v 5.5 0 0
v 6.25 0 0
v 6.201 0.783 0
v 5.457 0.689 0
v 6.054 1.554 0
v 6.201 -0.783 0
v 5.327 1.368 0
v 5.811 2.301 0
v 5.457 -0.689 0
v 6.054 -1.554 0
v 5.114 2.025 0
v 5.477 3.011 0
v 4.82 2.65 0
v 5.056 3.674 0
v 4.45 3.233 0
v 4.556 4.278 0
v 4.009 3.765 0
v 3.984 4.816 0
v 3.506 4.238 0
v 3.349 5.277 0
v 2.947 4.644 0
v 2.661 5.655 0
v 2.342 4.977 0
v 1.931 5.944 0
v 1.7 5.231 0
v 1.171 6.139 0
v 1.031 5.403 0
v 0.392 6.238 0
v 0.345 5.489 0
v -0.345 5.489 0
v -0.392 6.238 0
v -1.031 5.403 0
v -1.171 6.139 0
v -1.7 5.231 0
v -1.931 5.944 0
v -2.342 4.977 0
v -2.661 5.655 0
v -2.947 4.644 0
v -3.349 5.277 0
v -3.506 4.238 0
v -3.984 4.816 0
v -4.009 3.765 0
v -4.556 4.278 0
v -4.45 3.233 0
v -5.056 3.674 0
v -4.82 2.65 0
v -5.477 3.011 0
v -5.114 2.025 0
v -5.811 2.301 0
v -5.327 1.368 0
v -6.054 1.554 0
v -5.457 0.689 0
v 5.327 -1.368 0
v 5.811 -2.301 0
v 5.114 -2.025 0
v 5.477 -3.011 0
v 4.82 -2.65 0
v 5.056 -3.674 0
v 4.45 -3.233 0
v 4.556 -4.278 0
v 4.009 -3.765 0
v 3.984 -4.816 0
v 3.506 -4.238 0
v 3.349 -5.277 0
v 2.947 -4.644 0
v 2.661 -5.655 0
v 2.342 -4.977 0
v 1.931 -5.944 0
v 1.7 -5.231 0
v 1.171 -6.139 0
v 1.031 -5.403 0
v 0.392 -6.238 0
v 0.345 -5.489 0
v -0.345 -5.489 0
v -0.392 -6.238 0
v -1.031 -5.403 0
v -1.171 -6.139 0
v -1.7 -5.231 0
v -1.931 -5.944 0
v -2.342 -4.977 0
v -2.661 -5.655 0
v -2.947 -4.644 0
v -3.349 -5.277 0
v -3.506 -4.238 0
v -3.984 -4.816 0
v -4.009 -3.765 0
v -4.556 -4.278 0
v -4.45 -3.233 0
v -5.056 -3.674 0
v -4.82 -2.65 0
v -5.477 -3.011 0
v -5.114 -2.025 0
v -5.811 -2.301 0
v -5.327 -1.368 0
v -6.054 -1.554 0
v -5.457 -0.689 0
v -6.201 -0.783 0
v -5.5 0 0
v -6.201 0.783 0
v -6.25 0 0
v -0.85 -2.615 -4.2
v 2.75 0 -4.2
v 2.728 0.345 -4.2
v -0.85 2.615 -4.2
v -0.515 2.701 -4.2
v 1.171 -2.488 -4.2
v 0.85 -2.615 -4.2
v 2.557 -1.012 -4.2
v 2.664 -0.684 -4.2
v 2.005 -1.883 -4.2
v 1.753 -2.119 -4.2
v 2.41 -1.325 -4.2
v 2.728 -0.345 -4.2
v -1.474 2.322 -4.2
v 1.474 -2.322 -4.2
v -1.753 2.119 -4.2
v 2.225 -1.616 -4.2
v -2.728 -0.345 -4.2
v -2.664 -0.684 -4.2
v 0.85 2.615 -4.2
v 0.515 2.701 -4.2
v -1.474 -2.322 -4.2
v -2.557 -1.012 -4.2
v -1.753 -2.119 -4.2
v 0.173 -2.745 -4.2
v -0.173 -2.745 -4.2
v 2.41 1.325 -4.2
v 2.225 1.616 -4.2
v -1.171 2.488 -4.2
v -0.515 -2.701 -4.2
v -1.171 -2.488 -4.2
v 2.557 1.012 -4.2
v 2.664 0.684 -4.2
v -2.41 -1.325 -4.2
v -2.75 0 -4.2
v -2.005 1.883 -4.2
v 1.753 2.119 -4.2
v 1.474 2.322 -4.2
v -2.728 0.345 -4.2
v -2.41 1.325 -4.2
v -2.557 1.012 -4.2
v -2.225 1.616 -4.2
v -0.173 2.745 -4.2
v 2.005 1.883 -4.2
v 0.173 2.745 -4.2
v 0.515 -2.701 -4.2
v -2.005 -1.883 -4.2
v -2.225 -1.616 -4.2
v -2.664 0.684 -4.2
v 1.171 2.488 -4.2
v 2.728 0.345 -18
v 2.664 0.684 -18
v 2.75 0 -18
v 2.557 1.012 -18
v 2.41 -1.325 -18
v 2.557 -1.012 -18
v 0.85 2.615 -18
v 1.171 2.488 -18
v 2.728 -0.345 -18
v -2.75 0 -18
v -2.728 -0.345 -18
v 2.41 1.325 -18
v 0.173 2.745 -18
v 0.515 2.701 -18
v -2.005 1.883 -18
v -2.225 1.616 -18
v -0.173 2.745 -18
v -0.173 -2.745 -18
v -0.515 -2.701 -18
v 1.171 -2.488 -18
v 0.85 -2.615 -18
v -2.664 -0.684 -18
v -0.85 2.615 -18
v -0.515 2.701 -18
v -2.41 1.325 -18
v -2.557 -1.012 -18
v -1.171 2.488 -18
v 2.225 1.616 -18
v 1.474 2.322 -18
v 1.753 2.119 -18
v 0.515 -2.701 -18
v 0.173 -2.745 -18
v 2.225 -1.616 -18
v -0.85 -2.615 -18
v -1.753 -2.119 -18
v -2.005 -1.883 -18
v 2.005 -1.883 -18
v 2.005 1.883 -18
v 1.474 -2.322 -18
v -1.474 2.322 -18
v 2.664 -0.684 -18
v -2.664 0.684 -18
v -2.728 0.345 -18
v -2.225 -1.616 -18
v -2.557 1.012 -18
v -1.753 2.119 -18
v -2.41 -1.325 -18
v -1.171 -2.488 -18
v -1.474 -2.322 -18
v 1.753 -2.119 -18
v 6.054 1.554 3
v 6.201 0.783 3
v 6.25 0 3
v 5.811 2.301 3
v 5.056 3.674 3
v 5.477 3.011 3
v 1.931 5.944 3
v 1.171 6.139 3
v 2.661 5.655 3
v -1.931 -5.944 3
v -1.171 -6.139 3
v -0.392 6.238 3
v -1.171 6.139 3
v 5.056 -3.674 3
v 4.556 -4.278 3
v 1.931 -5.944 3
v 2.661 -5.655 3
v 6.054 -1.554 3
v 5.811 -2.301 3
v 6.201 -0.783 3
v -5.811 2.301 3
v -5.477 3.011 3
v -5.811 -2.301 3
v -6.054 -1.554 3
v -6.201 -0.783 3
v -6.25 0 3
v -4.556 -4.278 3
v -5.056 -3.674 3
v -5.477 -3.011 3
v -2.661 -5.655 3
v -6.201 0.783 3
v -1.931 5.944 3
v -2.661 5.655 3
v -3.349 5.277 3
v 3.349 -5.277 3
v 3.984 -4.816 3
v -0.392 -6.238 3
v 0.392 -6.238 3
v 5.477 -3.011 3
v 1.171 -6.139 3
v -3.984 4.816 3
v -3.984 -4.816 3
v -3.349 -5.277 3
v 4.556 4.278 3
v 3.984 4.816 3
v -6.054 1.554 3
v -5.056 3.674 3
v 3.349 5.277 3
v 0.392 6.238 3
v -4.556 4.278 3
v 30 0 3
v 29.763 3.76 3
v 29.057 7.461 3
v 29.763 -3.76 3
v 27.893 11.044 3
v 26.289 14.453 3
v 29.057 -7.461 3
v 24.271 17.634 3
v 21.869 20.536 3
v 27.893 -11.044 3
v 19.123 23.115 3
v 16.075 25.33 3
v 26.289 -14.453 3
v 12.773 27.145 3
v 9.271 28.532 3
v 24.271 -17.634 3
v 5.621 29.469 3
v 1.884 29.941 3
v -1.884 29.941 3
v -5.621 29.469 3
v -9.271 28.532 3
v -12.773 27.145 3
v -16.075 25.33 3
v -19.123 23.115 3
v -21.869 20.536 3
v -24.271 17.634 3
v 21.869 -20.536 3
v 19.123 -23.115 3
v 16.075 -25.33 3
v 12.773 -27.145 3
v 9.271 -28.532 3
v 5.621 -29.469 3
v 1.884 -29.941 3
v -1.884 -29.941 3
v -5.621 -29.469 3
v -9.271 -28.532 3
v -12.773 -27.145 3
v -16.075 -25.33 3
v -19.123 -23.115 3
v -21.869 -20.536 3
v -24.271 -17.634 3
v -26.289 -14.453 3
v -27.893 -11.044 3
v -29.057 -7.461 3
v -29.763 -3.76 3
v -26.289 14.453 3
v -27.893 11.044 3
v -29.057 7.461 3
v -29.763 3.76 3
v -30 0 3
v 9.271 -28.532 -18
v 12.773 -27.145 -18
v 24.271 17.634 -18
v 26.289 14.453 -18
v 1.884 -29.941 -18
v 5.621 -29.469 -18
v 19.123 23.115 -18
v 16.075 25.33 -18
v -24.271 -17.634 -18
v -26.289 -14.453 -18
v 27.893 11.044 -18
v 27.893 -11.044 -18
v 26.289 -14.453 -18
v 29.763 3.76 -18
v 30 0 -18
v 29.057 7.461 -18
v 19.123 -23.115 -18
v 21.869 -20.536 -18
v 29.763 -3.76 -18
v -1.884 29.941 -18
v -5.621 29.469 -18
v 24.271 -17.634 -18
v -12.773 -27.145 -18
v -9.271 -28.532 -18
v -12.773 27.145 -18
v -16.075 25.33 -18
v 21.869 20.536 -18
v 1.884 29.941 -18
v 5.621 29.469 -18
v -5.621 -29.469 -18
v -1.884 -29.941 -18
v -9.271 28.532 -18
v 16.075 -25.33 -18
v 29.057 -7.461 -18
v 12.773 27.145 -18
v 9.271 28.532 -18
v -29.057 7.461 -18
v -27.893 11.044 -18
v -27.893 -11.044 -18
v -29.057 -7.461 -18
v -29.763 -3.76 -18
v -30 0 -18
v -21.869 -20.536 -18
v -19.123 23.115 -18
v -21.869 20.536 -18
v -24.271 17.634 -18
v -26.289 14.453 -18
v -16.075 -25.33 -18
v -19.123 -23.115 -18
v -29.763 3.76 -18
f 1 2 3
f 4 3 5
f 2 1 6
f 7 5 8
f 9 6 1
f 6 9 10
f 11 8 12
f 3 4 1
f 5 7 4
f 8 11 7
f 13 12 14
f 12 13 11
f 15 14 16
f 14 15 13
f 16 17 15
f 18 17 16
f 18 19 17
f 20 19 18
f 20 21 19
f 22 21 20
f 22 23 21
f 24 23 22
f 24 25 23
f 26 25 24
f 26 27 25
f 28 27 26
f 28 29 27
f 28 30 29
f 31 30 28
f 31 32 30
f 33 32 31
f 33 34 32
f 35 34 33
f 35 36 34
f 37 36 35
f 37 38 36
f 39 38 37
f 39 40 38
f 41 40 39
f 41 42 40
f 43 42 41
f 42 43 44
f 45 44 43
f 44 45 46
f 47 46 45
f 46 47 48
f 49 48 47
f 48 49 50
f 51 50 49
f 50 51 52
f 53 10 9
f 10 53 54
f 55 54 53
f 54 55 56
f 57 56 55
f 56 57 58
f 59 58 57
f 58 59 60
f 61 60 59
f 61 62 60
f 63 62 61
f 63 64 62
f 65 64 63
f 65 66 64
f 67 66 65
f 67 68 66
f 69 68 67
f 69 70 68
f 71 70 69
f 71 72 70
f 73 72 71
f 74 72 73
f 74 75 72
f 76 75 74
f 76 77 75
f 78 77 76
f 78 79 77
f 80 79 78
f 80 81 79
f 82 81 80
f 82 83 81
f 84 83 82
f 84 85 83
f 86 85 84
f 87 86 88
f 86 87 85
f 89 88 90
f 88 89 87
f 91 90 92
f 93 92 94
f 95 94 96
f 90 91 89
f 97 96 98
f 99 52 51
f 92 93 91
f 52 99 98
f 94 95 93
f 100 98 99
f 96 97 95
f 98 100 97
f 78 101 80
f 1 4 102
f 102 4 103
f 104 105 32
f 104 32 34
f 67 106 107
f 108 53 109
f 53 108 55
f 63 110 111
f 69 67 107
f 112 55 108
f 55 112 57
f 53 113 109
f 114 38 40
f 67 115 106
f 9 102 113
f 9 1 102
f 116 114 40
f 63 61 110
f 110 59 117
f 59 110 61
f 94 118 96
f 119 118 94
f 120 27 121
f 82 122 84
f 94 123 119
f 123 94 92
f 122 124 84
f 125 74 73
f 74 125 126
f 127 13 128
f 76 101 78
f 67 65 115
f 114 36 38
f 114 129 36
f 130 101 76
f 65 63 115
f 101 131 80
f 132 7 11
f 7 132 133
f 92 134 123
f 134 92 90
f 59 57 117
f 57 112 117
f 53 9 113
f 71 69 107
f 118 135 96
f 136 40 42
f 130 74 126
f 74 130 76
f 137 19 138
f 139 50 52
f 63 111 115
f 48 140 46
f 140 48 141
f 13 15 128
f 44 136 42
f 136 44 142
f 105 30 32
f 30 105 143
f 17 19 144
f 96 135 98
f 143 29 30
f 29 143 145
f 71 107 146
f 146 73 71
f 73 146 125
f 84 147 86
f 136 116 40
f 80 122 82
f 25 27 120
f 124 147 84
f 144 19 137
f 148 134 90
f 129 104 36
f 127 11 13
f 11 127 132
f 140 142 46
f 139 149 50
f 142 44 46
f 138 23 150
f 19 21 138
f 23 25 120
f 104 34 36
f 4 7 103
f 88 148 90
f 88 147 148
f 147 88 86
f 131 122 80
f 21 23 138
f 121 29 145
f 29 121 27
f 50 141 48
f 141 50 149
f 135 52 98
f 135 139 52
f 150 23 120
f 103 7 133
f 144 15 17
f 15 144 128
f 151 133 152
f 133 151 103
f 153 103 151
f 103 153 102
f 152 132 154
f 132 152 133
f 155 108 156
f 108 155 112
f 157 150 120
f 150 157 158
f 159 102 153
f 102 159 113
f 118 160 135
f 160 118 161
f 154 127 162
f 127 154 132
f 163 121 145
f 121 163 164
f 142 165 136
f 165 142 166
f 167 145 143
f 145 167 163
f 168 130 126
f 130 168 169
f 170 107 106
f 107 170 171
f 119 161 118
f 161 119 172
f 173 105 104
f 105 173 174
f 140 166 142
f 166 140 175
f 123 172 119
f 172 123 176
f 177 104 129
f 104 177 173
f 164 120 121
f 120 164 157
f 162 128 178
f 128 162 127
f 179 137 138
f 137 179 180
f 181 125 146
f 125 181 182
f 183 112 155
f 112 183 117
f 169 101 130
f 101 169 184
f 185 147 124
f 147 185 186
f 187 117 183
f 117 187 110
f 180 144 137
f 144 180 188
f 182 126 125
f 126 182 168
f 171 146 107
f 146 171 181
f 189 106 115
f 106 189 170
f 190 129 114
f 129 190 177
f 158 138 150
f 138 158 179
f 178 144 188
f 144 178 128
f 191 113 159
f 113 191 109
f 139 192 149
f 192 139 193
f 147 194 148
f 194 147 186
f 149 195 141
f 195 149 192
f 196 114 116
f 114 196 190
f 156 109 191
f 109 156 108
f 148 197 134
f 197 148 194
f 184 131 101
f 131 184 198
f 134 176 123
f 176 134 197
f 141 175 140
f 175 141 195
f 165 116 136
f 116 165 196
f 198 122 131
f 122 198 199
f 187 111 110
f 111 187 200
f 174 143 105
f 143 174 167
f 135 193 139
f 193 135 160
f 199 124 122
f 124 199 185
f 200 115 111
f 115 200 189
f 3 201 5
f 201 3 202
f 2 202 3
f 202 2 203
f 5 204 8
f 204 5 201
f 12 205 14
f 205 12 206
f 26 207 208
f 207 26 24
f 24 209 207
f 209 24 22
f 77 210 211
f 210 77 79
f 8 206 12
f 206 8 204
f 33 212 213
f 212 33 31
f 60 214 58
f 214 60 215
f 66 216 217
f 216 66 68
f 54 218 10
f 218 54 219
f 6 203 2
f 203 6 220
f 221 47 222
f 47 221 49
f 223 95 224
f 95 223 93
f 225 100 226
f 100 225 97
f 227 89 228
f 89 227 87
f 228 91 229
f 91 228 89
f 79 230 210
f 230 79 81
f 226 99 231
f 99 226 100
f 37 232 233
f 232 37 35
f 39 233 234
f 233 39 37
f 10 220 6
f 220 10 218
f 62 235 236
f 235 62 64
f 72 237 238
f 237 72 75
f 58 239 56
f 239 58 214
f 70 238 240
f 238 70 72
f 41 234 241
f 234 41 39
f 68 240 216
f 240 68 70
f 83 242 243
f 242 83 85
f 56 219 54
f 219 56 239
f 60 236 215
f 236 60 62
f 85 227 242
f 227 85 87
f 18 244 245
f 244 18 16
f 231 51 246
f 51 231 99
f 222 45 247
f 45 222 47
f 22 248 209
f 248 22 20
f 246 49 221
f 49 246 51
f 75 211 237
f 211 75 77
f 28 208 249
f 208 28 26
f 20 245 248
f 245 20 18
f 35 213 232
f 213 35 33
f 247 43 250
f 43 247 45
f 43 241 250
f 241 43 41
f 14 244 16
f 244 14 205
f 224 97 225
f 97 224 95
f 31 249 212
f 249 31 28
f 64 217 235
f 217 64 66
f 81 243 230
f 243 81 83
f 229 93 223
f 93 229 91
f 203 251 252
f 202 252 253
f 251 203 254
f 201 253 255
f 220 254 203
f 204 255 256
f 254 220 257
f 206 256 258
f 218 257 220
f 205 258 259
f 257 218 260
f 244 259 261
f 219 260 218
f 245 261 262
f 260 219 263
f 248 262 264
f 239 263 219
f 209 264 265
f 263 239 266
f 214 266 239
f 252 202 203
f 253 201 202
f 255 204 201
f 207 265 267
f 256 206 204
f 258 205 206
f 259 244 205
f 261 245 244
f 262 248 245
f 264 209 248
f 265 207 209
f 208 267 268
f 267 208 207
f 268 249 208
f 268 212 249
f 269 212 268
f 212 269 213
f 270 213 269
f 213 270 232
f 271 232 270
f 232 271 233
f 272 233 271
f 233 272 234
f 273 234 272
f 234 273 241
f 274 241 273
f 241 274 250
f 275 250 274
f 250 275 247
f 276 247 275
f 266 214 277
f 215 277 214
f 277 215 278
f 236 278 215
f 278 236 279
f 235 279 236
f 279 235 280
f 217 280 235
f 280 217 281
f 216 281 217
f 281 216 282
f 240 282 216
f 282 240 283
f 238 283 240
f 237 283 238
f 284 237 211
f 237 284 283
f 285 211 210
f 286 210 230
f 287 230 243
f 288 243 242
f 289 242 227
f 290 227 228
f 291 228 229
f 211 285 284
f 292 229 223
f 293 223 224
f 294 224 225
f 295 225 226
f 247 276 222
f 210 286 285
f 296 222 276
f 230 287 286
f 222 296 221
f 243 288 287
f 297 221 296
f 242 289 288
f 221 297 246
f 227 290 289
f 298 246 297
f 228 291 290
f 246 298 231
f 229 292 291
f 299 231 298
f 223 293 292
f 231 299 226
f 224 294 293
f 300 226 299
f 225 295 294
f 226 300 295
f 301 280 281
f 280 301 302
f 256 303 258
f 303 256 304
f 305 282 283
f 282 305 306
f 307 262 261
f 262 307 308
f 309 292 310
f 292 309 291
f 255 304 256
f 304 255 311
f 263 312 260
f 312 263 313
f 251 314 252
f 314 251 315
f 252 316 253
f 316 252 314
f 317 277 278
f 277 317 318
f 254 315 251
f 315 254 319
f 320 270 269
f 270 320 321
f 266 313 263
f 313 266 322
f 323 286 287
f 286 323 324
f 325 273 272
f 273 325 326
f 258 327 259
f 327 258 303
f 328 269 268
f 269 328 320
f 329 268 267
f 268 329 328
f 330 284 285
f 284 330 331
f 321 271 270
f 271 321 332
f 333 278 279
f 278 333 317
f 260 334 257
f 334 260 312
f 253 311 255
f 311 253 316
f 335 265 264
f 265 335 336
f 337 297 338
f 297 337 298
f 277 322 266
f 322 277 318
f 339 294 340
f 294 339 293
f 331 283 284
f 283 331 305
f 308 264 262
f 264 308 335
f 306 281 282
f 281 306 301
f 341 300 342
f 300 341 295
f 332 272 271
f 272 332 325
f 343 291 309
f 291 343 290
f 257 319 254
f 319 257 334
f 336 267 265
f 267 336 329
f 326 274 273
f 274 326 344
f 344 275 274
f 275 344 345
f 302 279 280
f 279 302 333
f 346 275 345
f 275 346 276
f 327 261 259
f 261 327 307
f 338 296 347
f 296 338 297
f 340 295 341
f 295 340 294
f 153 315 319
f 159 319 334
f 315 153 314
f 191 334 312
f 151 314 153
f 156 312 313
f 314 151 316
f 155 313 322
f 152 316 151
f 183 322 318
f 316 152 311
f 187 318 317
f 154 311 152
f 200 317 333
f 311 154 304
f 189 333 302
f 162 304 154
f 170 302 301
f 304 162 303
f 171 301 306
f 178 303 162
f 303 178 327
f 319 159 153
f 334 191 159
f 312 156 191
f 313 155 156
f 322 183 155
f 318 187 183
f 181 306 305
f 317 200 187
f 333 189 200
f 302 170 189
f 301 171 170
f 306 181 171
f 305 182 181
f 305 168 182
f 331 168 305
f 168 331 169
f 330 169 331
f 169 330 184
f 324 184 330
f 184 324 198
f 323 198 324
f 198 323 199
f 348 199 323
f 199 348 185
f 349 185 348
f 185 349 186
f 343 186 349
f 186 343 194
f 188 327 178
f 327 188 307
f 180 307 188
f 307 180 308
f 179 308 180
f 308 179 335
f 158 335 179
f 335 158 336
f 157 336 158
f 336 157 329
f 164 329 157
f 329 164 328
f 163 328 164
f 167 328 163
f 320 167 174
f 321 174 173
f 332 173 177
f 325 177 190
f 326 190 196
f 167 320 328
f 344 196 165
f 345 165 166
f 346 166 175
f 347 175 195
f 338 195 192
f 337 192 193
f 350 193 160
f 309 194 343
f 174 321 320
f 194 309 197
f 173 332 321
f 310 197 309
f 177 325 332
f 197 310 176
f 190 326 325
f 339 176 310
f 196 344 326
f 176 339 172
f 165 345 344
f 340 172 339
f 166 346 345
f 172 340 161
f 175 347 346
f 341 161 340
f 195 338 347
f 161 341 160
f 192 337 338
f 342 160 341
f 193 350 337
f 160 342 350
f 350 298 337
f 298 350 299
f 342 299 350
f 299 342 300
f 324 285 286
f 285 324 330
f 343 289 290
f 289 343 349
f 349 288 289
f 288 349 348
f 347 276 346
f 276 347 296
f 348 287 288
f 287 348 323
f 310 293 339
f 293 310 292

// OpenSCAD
$fn = 50;

difference() {
	union() {
		translate(v = [0, 0, -18.0]) {
			cylinder(h = 21, r = 30.0);
		}
	}
	union() {
		translate(v = [0, 0, 0]) {
			rotate(a = [0, 0, 0]) {
				difference() {
					union() {
						translate(v = [0, 0, -21.0]) {
							cylinder(h = 21, r = 2.25);
						}
						translate(v = [0, 0, -4.2]) {
							cylinder(h = 4.2, r1 = 2.75, r2 = 5.5);
						}
						translate(v = [0, 0, -21.0]) {
							cylinder(h = 21, r = 2.75);
						}
						translate(v = [0, 0, -21.0]) {
							cylinder(h = 21, r = 2.25);
						}
					}
					union();
				}
			}
		}
		#cylinder(h = 3, r = 6.25);
	}
}
